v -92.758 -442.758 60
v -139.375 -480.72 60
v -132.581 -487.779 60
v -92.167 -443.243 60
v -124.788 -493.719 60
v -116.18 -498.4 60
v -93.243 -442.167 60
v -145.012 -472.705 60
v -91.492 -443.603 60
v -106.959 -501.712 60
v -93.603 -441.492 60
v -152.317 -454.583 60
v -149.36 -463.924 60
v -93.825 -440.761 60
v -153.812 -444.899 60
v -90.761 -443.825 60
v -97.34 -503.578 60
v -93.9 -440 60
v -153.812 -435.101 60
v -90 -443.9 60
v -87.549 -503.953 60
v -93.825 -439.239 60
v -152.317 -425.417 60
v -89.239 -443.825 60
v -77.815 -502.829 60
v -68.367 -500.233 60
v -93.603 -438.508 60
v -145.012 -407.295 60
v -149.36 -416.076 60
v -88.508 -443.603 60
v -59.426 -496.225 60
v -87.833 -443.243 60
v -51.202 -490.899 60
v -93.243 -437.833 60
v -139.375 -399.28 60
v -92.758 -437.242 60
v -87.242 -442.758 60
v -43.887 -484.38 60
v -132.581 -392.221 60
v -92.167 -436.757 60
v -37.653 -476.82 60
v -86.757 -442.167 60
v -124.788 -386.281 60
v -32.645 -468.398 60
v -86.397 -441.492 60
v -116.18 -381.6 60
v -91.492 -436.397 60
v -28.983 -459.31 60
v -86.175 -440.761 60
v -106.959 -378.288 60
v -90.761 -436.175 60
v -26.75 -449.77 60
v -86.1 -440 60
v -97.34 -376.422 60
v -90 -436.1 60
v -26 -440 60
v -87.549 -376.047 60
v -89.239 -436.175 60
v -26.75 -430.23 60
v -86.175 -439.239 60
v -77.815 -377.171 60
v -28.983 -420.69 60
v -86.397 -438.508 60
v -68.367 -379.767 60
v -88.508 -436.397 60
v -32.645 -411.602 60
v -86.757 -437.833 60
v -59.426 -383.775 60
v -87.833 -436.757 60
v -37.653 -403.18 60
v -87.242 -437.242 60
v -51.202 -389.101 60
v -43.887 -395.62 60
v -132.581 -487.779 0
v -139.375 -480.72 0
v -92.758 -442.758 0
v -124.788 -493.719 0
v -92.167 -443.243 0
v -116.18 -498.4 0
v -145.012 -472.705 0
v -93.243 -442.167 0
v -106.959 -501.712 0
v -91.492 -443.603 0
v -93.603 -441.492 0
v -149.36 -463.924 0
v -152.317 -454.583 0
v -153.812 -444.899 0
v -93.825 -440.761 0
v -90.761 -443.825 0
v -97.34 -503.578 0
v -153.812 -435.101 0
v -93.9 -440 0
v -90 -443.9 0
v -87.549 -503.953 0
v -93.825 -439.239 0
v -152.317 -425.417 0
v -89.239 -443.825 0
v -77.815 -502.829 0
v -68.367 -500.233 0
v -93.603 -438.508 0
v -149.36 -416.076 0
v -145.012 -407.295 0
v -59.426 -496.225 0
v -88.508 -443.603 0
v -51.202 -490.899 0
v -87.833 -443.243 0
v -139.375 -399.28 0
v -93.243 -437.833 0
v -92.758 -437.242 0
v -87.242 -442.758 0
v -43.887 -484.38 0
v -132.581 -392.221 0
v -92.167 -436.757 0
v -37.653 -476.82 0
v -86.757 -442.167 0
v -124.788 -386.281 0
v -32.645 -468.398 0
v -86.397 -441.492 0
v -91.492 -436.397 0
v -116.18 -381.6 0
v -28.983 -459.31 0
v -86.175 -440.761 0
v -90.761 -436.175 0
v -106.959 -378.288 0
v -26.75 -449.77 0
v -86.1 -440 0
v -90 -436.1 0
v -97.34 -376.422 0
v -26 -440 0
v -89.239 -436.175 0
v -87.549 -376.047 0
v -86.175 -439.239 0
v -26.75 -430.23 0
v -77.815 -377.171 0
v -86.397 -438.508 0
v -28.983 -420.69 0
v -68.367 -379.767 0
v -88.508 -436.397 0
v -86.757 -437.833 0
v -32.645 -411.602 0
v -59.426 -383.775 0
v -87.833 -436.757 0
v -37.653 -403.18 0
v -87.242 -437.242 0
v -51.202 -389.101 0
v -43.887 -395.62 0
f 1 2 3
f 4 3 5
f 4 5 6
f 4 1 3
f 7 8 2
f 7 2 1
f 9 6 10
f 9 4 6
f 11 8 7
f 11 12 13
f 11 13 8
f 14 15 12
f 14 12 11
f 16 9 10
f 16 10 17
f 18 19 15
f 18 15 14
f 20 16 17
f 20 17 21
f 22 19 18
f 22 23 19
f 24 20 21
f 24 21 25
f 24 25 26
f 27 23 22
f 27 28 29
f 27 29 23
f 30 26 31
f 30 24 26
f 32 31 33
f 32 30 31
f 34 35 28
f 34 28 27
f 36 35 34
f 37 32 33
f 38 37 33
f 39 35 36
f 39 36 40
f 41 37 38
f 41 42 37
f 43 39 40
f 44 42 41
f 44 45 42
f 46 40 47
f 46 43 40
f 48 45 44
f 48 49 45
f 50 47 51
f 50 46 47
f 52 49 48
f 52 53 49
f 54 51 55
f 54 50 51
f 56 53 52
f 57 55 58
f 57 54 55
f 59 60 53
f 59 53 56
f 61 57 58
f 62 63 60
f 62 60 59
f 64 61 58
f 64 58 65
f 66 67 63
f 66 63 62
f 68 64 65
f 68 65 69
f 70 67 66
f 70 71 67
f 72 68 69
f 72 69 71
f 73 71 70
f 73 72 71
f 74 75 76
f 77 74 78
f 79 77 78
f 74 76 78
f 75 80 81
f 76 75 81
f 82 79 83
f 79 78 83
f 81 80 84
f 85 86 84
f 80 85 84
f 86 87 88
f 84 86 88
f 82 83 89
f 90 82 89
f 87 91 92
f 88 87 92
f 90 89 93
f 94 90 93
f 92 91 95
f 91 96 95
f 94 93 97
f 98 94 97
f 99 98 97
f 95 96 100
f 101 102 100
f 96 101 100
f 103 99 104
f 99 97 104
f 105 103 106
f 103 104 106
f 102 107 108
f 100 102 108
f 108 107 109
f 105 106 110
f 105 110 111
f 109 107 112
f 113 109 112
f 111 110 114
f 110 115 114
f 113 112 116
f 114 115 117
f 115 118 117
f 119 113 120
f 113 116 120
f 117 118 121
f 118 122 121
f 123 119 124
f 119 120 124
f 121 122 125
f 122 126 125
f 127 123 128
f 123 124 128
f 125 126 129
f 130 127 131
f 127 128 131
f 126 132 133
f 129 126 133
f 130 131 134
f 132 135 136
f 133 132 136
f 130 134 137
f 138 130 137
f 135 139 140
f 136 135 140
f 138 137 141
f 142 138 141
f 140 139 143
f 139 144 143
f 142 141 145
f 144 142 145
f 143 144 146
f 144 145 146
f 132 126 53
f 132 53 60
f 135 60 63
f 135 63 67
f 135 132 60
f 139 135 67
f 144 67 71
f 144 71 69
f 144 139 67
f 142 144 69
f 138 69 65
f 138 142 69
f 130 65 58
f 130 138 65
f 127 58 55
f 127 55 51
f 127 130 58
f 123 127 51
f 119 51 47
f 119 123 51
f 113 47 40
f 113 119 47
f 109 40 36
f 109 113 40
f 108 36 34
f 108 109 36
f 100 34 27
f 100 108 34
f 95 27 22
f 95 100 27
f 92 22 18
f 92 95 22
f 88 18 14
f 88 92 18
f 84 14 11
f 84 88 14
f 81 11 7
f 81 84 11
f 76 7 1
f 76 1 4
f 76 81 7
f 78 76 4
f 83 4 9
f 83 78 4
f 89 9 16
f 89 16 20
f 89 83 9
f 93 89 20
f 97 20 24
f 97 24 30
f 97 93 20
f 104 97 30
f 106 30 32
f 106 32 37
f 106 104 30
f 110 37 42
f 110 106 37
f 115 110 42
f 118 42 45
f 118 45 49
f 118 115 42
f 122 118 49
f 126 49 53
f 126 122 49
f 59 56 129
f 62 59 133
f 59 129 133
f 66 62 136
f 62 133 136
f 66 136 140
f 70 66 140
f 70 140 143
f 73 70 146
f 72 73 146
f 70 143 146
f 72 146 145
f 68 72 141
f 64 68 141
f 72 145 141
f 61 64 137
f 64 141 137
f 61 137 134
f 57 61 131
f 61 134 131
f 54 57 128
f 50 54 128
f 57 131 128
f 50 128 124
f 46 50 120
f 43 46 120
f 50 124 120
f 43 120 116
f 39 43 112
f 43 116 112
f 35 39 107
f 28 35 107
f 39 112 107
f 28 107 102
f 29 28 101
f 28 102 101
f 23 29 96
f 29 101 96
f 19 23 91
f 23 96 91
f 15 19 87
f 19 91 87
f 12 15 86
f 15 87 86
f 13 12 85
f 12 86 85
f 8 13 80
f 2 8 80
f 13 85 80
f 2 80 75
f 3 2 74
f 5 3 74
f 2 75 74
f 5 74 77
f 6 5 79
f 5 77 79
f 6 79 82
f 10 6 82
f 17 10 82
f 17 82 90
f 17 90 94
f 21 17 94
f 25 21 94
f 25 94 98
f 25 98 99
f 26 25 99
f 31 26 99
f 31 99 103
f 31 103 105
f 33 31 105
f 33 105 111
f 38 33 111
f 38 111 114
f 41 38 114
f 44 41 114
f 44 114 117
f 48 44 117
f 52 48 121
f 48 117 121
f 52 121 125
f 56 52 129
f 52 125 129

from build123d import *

# Parameters (mm, degrees)
CYLINDER_R     = 3.9
CYLINDER_DEPTH = 60
SKETCH_R       = 64
PAD_DEPTH      = 60


with BuildPart() as cylinder:
    # Cylinder → Cylinder (new body)
    with BuildSketch(Plane.XY):
        Circle(CYLINDER_R)
    extrude(amount=CYLINDER_DEPTH)


with BuildPart() as cut:
    # Sketch → Pad (new body)
    with BuildSketch(Plane.XY):
        Circle(SKETCH_R)
    extrude(amount=PAD_DEPTH)

    # Cut: cut Cylinder
    add(cylinder.part, mode=Mode.SUBTRACT)


with BuildPart() as cut_1:
    # Cut placement: moved
    add(cut.part.moved(Location((-90, -440, 0))))


solid = cut_1.part
